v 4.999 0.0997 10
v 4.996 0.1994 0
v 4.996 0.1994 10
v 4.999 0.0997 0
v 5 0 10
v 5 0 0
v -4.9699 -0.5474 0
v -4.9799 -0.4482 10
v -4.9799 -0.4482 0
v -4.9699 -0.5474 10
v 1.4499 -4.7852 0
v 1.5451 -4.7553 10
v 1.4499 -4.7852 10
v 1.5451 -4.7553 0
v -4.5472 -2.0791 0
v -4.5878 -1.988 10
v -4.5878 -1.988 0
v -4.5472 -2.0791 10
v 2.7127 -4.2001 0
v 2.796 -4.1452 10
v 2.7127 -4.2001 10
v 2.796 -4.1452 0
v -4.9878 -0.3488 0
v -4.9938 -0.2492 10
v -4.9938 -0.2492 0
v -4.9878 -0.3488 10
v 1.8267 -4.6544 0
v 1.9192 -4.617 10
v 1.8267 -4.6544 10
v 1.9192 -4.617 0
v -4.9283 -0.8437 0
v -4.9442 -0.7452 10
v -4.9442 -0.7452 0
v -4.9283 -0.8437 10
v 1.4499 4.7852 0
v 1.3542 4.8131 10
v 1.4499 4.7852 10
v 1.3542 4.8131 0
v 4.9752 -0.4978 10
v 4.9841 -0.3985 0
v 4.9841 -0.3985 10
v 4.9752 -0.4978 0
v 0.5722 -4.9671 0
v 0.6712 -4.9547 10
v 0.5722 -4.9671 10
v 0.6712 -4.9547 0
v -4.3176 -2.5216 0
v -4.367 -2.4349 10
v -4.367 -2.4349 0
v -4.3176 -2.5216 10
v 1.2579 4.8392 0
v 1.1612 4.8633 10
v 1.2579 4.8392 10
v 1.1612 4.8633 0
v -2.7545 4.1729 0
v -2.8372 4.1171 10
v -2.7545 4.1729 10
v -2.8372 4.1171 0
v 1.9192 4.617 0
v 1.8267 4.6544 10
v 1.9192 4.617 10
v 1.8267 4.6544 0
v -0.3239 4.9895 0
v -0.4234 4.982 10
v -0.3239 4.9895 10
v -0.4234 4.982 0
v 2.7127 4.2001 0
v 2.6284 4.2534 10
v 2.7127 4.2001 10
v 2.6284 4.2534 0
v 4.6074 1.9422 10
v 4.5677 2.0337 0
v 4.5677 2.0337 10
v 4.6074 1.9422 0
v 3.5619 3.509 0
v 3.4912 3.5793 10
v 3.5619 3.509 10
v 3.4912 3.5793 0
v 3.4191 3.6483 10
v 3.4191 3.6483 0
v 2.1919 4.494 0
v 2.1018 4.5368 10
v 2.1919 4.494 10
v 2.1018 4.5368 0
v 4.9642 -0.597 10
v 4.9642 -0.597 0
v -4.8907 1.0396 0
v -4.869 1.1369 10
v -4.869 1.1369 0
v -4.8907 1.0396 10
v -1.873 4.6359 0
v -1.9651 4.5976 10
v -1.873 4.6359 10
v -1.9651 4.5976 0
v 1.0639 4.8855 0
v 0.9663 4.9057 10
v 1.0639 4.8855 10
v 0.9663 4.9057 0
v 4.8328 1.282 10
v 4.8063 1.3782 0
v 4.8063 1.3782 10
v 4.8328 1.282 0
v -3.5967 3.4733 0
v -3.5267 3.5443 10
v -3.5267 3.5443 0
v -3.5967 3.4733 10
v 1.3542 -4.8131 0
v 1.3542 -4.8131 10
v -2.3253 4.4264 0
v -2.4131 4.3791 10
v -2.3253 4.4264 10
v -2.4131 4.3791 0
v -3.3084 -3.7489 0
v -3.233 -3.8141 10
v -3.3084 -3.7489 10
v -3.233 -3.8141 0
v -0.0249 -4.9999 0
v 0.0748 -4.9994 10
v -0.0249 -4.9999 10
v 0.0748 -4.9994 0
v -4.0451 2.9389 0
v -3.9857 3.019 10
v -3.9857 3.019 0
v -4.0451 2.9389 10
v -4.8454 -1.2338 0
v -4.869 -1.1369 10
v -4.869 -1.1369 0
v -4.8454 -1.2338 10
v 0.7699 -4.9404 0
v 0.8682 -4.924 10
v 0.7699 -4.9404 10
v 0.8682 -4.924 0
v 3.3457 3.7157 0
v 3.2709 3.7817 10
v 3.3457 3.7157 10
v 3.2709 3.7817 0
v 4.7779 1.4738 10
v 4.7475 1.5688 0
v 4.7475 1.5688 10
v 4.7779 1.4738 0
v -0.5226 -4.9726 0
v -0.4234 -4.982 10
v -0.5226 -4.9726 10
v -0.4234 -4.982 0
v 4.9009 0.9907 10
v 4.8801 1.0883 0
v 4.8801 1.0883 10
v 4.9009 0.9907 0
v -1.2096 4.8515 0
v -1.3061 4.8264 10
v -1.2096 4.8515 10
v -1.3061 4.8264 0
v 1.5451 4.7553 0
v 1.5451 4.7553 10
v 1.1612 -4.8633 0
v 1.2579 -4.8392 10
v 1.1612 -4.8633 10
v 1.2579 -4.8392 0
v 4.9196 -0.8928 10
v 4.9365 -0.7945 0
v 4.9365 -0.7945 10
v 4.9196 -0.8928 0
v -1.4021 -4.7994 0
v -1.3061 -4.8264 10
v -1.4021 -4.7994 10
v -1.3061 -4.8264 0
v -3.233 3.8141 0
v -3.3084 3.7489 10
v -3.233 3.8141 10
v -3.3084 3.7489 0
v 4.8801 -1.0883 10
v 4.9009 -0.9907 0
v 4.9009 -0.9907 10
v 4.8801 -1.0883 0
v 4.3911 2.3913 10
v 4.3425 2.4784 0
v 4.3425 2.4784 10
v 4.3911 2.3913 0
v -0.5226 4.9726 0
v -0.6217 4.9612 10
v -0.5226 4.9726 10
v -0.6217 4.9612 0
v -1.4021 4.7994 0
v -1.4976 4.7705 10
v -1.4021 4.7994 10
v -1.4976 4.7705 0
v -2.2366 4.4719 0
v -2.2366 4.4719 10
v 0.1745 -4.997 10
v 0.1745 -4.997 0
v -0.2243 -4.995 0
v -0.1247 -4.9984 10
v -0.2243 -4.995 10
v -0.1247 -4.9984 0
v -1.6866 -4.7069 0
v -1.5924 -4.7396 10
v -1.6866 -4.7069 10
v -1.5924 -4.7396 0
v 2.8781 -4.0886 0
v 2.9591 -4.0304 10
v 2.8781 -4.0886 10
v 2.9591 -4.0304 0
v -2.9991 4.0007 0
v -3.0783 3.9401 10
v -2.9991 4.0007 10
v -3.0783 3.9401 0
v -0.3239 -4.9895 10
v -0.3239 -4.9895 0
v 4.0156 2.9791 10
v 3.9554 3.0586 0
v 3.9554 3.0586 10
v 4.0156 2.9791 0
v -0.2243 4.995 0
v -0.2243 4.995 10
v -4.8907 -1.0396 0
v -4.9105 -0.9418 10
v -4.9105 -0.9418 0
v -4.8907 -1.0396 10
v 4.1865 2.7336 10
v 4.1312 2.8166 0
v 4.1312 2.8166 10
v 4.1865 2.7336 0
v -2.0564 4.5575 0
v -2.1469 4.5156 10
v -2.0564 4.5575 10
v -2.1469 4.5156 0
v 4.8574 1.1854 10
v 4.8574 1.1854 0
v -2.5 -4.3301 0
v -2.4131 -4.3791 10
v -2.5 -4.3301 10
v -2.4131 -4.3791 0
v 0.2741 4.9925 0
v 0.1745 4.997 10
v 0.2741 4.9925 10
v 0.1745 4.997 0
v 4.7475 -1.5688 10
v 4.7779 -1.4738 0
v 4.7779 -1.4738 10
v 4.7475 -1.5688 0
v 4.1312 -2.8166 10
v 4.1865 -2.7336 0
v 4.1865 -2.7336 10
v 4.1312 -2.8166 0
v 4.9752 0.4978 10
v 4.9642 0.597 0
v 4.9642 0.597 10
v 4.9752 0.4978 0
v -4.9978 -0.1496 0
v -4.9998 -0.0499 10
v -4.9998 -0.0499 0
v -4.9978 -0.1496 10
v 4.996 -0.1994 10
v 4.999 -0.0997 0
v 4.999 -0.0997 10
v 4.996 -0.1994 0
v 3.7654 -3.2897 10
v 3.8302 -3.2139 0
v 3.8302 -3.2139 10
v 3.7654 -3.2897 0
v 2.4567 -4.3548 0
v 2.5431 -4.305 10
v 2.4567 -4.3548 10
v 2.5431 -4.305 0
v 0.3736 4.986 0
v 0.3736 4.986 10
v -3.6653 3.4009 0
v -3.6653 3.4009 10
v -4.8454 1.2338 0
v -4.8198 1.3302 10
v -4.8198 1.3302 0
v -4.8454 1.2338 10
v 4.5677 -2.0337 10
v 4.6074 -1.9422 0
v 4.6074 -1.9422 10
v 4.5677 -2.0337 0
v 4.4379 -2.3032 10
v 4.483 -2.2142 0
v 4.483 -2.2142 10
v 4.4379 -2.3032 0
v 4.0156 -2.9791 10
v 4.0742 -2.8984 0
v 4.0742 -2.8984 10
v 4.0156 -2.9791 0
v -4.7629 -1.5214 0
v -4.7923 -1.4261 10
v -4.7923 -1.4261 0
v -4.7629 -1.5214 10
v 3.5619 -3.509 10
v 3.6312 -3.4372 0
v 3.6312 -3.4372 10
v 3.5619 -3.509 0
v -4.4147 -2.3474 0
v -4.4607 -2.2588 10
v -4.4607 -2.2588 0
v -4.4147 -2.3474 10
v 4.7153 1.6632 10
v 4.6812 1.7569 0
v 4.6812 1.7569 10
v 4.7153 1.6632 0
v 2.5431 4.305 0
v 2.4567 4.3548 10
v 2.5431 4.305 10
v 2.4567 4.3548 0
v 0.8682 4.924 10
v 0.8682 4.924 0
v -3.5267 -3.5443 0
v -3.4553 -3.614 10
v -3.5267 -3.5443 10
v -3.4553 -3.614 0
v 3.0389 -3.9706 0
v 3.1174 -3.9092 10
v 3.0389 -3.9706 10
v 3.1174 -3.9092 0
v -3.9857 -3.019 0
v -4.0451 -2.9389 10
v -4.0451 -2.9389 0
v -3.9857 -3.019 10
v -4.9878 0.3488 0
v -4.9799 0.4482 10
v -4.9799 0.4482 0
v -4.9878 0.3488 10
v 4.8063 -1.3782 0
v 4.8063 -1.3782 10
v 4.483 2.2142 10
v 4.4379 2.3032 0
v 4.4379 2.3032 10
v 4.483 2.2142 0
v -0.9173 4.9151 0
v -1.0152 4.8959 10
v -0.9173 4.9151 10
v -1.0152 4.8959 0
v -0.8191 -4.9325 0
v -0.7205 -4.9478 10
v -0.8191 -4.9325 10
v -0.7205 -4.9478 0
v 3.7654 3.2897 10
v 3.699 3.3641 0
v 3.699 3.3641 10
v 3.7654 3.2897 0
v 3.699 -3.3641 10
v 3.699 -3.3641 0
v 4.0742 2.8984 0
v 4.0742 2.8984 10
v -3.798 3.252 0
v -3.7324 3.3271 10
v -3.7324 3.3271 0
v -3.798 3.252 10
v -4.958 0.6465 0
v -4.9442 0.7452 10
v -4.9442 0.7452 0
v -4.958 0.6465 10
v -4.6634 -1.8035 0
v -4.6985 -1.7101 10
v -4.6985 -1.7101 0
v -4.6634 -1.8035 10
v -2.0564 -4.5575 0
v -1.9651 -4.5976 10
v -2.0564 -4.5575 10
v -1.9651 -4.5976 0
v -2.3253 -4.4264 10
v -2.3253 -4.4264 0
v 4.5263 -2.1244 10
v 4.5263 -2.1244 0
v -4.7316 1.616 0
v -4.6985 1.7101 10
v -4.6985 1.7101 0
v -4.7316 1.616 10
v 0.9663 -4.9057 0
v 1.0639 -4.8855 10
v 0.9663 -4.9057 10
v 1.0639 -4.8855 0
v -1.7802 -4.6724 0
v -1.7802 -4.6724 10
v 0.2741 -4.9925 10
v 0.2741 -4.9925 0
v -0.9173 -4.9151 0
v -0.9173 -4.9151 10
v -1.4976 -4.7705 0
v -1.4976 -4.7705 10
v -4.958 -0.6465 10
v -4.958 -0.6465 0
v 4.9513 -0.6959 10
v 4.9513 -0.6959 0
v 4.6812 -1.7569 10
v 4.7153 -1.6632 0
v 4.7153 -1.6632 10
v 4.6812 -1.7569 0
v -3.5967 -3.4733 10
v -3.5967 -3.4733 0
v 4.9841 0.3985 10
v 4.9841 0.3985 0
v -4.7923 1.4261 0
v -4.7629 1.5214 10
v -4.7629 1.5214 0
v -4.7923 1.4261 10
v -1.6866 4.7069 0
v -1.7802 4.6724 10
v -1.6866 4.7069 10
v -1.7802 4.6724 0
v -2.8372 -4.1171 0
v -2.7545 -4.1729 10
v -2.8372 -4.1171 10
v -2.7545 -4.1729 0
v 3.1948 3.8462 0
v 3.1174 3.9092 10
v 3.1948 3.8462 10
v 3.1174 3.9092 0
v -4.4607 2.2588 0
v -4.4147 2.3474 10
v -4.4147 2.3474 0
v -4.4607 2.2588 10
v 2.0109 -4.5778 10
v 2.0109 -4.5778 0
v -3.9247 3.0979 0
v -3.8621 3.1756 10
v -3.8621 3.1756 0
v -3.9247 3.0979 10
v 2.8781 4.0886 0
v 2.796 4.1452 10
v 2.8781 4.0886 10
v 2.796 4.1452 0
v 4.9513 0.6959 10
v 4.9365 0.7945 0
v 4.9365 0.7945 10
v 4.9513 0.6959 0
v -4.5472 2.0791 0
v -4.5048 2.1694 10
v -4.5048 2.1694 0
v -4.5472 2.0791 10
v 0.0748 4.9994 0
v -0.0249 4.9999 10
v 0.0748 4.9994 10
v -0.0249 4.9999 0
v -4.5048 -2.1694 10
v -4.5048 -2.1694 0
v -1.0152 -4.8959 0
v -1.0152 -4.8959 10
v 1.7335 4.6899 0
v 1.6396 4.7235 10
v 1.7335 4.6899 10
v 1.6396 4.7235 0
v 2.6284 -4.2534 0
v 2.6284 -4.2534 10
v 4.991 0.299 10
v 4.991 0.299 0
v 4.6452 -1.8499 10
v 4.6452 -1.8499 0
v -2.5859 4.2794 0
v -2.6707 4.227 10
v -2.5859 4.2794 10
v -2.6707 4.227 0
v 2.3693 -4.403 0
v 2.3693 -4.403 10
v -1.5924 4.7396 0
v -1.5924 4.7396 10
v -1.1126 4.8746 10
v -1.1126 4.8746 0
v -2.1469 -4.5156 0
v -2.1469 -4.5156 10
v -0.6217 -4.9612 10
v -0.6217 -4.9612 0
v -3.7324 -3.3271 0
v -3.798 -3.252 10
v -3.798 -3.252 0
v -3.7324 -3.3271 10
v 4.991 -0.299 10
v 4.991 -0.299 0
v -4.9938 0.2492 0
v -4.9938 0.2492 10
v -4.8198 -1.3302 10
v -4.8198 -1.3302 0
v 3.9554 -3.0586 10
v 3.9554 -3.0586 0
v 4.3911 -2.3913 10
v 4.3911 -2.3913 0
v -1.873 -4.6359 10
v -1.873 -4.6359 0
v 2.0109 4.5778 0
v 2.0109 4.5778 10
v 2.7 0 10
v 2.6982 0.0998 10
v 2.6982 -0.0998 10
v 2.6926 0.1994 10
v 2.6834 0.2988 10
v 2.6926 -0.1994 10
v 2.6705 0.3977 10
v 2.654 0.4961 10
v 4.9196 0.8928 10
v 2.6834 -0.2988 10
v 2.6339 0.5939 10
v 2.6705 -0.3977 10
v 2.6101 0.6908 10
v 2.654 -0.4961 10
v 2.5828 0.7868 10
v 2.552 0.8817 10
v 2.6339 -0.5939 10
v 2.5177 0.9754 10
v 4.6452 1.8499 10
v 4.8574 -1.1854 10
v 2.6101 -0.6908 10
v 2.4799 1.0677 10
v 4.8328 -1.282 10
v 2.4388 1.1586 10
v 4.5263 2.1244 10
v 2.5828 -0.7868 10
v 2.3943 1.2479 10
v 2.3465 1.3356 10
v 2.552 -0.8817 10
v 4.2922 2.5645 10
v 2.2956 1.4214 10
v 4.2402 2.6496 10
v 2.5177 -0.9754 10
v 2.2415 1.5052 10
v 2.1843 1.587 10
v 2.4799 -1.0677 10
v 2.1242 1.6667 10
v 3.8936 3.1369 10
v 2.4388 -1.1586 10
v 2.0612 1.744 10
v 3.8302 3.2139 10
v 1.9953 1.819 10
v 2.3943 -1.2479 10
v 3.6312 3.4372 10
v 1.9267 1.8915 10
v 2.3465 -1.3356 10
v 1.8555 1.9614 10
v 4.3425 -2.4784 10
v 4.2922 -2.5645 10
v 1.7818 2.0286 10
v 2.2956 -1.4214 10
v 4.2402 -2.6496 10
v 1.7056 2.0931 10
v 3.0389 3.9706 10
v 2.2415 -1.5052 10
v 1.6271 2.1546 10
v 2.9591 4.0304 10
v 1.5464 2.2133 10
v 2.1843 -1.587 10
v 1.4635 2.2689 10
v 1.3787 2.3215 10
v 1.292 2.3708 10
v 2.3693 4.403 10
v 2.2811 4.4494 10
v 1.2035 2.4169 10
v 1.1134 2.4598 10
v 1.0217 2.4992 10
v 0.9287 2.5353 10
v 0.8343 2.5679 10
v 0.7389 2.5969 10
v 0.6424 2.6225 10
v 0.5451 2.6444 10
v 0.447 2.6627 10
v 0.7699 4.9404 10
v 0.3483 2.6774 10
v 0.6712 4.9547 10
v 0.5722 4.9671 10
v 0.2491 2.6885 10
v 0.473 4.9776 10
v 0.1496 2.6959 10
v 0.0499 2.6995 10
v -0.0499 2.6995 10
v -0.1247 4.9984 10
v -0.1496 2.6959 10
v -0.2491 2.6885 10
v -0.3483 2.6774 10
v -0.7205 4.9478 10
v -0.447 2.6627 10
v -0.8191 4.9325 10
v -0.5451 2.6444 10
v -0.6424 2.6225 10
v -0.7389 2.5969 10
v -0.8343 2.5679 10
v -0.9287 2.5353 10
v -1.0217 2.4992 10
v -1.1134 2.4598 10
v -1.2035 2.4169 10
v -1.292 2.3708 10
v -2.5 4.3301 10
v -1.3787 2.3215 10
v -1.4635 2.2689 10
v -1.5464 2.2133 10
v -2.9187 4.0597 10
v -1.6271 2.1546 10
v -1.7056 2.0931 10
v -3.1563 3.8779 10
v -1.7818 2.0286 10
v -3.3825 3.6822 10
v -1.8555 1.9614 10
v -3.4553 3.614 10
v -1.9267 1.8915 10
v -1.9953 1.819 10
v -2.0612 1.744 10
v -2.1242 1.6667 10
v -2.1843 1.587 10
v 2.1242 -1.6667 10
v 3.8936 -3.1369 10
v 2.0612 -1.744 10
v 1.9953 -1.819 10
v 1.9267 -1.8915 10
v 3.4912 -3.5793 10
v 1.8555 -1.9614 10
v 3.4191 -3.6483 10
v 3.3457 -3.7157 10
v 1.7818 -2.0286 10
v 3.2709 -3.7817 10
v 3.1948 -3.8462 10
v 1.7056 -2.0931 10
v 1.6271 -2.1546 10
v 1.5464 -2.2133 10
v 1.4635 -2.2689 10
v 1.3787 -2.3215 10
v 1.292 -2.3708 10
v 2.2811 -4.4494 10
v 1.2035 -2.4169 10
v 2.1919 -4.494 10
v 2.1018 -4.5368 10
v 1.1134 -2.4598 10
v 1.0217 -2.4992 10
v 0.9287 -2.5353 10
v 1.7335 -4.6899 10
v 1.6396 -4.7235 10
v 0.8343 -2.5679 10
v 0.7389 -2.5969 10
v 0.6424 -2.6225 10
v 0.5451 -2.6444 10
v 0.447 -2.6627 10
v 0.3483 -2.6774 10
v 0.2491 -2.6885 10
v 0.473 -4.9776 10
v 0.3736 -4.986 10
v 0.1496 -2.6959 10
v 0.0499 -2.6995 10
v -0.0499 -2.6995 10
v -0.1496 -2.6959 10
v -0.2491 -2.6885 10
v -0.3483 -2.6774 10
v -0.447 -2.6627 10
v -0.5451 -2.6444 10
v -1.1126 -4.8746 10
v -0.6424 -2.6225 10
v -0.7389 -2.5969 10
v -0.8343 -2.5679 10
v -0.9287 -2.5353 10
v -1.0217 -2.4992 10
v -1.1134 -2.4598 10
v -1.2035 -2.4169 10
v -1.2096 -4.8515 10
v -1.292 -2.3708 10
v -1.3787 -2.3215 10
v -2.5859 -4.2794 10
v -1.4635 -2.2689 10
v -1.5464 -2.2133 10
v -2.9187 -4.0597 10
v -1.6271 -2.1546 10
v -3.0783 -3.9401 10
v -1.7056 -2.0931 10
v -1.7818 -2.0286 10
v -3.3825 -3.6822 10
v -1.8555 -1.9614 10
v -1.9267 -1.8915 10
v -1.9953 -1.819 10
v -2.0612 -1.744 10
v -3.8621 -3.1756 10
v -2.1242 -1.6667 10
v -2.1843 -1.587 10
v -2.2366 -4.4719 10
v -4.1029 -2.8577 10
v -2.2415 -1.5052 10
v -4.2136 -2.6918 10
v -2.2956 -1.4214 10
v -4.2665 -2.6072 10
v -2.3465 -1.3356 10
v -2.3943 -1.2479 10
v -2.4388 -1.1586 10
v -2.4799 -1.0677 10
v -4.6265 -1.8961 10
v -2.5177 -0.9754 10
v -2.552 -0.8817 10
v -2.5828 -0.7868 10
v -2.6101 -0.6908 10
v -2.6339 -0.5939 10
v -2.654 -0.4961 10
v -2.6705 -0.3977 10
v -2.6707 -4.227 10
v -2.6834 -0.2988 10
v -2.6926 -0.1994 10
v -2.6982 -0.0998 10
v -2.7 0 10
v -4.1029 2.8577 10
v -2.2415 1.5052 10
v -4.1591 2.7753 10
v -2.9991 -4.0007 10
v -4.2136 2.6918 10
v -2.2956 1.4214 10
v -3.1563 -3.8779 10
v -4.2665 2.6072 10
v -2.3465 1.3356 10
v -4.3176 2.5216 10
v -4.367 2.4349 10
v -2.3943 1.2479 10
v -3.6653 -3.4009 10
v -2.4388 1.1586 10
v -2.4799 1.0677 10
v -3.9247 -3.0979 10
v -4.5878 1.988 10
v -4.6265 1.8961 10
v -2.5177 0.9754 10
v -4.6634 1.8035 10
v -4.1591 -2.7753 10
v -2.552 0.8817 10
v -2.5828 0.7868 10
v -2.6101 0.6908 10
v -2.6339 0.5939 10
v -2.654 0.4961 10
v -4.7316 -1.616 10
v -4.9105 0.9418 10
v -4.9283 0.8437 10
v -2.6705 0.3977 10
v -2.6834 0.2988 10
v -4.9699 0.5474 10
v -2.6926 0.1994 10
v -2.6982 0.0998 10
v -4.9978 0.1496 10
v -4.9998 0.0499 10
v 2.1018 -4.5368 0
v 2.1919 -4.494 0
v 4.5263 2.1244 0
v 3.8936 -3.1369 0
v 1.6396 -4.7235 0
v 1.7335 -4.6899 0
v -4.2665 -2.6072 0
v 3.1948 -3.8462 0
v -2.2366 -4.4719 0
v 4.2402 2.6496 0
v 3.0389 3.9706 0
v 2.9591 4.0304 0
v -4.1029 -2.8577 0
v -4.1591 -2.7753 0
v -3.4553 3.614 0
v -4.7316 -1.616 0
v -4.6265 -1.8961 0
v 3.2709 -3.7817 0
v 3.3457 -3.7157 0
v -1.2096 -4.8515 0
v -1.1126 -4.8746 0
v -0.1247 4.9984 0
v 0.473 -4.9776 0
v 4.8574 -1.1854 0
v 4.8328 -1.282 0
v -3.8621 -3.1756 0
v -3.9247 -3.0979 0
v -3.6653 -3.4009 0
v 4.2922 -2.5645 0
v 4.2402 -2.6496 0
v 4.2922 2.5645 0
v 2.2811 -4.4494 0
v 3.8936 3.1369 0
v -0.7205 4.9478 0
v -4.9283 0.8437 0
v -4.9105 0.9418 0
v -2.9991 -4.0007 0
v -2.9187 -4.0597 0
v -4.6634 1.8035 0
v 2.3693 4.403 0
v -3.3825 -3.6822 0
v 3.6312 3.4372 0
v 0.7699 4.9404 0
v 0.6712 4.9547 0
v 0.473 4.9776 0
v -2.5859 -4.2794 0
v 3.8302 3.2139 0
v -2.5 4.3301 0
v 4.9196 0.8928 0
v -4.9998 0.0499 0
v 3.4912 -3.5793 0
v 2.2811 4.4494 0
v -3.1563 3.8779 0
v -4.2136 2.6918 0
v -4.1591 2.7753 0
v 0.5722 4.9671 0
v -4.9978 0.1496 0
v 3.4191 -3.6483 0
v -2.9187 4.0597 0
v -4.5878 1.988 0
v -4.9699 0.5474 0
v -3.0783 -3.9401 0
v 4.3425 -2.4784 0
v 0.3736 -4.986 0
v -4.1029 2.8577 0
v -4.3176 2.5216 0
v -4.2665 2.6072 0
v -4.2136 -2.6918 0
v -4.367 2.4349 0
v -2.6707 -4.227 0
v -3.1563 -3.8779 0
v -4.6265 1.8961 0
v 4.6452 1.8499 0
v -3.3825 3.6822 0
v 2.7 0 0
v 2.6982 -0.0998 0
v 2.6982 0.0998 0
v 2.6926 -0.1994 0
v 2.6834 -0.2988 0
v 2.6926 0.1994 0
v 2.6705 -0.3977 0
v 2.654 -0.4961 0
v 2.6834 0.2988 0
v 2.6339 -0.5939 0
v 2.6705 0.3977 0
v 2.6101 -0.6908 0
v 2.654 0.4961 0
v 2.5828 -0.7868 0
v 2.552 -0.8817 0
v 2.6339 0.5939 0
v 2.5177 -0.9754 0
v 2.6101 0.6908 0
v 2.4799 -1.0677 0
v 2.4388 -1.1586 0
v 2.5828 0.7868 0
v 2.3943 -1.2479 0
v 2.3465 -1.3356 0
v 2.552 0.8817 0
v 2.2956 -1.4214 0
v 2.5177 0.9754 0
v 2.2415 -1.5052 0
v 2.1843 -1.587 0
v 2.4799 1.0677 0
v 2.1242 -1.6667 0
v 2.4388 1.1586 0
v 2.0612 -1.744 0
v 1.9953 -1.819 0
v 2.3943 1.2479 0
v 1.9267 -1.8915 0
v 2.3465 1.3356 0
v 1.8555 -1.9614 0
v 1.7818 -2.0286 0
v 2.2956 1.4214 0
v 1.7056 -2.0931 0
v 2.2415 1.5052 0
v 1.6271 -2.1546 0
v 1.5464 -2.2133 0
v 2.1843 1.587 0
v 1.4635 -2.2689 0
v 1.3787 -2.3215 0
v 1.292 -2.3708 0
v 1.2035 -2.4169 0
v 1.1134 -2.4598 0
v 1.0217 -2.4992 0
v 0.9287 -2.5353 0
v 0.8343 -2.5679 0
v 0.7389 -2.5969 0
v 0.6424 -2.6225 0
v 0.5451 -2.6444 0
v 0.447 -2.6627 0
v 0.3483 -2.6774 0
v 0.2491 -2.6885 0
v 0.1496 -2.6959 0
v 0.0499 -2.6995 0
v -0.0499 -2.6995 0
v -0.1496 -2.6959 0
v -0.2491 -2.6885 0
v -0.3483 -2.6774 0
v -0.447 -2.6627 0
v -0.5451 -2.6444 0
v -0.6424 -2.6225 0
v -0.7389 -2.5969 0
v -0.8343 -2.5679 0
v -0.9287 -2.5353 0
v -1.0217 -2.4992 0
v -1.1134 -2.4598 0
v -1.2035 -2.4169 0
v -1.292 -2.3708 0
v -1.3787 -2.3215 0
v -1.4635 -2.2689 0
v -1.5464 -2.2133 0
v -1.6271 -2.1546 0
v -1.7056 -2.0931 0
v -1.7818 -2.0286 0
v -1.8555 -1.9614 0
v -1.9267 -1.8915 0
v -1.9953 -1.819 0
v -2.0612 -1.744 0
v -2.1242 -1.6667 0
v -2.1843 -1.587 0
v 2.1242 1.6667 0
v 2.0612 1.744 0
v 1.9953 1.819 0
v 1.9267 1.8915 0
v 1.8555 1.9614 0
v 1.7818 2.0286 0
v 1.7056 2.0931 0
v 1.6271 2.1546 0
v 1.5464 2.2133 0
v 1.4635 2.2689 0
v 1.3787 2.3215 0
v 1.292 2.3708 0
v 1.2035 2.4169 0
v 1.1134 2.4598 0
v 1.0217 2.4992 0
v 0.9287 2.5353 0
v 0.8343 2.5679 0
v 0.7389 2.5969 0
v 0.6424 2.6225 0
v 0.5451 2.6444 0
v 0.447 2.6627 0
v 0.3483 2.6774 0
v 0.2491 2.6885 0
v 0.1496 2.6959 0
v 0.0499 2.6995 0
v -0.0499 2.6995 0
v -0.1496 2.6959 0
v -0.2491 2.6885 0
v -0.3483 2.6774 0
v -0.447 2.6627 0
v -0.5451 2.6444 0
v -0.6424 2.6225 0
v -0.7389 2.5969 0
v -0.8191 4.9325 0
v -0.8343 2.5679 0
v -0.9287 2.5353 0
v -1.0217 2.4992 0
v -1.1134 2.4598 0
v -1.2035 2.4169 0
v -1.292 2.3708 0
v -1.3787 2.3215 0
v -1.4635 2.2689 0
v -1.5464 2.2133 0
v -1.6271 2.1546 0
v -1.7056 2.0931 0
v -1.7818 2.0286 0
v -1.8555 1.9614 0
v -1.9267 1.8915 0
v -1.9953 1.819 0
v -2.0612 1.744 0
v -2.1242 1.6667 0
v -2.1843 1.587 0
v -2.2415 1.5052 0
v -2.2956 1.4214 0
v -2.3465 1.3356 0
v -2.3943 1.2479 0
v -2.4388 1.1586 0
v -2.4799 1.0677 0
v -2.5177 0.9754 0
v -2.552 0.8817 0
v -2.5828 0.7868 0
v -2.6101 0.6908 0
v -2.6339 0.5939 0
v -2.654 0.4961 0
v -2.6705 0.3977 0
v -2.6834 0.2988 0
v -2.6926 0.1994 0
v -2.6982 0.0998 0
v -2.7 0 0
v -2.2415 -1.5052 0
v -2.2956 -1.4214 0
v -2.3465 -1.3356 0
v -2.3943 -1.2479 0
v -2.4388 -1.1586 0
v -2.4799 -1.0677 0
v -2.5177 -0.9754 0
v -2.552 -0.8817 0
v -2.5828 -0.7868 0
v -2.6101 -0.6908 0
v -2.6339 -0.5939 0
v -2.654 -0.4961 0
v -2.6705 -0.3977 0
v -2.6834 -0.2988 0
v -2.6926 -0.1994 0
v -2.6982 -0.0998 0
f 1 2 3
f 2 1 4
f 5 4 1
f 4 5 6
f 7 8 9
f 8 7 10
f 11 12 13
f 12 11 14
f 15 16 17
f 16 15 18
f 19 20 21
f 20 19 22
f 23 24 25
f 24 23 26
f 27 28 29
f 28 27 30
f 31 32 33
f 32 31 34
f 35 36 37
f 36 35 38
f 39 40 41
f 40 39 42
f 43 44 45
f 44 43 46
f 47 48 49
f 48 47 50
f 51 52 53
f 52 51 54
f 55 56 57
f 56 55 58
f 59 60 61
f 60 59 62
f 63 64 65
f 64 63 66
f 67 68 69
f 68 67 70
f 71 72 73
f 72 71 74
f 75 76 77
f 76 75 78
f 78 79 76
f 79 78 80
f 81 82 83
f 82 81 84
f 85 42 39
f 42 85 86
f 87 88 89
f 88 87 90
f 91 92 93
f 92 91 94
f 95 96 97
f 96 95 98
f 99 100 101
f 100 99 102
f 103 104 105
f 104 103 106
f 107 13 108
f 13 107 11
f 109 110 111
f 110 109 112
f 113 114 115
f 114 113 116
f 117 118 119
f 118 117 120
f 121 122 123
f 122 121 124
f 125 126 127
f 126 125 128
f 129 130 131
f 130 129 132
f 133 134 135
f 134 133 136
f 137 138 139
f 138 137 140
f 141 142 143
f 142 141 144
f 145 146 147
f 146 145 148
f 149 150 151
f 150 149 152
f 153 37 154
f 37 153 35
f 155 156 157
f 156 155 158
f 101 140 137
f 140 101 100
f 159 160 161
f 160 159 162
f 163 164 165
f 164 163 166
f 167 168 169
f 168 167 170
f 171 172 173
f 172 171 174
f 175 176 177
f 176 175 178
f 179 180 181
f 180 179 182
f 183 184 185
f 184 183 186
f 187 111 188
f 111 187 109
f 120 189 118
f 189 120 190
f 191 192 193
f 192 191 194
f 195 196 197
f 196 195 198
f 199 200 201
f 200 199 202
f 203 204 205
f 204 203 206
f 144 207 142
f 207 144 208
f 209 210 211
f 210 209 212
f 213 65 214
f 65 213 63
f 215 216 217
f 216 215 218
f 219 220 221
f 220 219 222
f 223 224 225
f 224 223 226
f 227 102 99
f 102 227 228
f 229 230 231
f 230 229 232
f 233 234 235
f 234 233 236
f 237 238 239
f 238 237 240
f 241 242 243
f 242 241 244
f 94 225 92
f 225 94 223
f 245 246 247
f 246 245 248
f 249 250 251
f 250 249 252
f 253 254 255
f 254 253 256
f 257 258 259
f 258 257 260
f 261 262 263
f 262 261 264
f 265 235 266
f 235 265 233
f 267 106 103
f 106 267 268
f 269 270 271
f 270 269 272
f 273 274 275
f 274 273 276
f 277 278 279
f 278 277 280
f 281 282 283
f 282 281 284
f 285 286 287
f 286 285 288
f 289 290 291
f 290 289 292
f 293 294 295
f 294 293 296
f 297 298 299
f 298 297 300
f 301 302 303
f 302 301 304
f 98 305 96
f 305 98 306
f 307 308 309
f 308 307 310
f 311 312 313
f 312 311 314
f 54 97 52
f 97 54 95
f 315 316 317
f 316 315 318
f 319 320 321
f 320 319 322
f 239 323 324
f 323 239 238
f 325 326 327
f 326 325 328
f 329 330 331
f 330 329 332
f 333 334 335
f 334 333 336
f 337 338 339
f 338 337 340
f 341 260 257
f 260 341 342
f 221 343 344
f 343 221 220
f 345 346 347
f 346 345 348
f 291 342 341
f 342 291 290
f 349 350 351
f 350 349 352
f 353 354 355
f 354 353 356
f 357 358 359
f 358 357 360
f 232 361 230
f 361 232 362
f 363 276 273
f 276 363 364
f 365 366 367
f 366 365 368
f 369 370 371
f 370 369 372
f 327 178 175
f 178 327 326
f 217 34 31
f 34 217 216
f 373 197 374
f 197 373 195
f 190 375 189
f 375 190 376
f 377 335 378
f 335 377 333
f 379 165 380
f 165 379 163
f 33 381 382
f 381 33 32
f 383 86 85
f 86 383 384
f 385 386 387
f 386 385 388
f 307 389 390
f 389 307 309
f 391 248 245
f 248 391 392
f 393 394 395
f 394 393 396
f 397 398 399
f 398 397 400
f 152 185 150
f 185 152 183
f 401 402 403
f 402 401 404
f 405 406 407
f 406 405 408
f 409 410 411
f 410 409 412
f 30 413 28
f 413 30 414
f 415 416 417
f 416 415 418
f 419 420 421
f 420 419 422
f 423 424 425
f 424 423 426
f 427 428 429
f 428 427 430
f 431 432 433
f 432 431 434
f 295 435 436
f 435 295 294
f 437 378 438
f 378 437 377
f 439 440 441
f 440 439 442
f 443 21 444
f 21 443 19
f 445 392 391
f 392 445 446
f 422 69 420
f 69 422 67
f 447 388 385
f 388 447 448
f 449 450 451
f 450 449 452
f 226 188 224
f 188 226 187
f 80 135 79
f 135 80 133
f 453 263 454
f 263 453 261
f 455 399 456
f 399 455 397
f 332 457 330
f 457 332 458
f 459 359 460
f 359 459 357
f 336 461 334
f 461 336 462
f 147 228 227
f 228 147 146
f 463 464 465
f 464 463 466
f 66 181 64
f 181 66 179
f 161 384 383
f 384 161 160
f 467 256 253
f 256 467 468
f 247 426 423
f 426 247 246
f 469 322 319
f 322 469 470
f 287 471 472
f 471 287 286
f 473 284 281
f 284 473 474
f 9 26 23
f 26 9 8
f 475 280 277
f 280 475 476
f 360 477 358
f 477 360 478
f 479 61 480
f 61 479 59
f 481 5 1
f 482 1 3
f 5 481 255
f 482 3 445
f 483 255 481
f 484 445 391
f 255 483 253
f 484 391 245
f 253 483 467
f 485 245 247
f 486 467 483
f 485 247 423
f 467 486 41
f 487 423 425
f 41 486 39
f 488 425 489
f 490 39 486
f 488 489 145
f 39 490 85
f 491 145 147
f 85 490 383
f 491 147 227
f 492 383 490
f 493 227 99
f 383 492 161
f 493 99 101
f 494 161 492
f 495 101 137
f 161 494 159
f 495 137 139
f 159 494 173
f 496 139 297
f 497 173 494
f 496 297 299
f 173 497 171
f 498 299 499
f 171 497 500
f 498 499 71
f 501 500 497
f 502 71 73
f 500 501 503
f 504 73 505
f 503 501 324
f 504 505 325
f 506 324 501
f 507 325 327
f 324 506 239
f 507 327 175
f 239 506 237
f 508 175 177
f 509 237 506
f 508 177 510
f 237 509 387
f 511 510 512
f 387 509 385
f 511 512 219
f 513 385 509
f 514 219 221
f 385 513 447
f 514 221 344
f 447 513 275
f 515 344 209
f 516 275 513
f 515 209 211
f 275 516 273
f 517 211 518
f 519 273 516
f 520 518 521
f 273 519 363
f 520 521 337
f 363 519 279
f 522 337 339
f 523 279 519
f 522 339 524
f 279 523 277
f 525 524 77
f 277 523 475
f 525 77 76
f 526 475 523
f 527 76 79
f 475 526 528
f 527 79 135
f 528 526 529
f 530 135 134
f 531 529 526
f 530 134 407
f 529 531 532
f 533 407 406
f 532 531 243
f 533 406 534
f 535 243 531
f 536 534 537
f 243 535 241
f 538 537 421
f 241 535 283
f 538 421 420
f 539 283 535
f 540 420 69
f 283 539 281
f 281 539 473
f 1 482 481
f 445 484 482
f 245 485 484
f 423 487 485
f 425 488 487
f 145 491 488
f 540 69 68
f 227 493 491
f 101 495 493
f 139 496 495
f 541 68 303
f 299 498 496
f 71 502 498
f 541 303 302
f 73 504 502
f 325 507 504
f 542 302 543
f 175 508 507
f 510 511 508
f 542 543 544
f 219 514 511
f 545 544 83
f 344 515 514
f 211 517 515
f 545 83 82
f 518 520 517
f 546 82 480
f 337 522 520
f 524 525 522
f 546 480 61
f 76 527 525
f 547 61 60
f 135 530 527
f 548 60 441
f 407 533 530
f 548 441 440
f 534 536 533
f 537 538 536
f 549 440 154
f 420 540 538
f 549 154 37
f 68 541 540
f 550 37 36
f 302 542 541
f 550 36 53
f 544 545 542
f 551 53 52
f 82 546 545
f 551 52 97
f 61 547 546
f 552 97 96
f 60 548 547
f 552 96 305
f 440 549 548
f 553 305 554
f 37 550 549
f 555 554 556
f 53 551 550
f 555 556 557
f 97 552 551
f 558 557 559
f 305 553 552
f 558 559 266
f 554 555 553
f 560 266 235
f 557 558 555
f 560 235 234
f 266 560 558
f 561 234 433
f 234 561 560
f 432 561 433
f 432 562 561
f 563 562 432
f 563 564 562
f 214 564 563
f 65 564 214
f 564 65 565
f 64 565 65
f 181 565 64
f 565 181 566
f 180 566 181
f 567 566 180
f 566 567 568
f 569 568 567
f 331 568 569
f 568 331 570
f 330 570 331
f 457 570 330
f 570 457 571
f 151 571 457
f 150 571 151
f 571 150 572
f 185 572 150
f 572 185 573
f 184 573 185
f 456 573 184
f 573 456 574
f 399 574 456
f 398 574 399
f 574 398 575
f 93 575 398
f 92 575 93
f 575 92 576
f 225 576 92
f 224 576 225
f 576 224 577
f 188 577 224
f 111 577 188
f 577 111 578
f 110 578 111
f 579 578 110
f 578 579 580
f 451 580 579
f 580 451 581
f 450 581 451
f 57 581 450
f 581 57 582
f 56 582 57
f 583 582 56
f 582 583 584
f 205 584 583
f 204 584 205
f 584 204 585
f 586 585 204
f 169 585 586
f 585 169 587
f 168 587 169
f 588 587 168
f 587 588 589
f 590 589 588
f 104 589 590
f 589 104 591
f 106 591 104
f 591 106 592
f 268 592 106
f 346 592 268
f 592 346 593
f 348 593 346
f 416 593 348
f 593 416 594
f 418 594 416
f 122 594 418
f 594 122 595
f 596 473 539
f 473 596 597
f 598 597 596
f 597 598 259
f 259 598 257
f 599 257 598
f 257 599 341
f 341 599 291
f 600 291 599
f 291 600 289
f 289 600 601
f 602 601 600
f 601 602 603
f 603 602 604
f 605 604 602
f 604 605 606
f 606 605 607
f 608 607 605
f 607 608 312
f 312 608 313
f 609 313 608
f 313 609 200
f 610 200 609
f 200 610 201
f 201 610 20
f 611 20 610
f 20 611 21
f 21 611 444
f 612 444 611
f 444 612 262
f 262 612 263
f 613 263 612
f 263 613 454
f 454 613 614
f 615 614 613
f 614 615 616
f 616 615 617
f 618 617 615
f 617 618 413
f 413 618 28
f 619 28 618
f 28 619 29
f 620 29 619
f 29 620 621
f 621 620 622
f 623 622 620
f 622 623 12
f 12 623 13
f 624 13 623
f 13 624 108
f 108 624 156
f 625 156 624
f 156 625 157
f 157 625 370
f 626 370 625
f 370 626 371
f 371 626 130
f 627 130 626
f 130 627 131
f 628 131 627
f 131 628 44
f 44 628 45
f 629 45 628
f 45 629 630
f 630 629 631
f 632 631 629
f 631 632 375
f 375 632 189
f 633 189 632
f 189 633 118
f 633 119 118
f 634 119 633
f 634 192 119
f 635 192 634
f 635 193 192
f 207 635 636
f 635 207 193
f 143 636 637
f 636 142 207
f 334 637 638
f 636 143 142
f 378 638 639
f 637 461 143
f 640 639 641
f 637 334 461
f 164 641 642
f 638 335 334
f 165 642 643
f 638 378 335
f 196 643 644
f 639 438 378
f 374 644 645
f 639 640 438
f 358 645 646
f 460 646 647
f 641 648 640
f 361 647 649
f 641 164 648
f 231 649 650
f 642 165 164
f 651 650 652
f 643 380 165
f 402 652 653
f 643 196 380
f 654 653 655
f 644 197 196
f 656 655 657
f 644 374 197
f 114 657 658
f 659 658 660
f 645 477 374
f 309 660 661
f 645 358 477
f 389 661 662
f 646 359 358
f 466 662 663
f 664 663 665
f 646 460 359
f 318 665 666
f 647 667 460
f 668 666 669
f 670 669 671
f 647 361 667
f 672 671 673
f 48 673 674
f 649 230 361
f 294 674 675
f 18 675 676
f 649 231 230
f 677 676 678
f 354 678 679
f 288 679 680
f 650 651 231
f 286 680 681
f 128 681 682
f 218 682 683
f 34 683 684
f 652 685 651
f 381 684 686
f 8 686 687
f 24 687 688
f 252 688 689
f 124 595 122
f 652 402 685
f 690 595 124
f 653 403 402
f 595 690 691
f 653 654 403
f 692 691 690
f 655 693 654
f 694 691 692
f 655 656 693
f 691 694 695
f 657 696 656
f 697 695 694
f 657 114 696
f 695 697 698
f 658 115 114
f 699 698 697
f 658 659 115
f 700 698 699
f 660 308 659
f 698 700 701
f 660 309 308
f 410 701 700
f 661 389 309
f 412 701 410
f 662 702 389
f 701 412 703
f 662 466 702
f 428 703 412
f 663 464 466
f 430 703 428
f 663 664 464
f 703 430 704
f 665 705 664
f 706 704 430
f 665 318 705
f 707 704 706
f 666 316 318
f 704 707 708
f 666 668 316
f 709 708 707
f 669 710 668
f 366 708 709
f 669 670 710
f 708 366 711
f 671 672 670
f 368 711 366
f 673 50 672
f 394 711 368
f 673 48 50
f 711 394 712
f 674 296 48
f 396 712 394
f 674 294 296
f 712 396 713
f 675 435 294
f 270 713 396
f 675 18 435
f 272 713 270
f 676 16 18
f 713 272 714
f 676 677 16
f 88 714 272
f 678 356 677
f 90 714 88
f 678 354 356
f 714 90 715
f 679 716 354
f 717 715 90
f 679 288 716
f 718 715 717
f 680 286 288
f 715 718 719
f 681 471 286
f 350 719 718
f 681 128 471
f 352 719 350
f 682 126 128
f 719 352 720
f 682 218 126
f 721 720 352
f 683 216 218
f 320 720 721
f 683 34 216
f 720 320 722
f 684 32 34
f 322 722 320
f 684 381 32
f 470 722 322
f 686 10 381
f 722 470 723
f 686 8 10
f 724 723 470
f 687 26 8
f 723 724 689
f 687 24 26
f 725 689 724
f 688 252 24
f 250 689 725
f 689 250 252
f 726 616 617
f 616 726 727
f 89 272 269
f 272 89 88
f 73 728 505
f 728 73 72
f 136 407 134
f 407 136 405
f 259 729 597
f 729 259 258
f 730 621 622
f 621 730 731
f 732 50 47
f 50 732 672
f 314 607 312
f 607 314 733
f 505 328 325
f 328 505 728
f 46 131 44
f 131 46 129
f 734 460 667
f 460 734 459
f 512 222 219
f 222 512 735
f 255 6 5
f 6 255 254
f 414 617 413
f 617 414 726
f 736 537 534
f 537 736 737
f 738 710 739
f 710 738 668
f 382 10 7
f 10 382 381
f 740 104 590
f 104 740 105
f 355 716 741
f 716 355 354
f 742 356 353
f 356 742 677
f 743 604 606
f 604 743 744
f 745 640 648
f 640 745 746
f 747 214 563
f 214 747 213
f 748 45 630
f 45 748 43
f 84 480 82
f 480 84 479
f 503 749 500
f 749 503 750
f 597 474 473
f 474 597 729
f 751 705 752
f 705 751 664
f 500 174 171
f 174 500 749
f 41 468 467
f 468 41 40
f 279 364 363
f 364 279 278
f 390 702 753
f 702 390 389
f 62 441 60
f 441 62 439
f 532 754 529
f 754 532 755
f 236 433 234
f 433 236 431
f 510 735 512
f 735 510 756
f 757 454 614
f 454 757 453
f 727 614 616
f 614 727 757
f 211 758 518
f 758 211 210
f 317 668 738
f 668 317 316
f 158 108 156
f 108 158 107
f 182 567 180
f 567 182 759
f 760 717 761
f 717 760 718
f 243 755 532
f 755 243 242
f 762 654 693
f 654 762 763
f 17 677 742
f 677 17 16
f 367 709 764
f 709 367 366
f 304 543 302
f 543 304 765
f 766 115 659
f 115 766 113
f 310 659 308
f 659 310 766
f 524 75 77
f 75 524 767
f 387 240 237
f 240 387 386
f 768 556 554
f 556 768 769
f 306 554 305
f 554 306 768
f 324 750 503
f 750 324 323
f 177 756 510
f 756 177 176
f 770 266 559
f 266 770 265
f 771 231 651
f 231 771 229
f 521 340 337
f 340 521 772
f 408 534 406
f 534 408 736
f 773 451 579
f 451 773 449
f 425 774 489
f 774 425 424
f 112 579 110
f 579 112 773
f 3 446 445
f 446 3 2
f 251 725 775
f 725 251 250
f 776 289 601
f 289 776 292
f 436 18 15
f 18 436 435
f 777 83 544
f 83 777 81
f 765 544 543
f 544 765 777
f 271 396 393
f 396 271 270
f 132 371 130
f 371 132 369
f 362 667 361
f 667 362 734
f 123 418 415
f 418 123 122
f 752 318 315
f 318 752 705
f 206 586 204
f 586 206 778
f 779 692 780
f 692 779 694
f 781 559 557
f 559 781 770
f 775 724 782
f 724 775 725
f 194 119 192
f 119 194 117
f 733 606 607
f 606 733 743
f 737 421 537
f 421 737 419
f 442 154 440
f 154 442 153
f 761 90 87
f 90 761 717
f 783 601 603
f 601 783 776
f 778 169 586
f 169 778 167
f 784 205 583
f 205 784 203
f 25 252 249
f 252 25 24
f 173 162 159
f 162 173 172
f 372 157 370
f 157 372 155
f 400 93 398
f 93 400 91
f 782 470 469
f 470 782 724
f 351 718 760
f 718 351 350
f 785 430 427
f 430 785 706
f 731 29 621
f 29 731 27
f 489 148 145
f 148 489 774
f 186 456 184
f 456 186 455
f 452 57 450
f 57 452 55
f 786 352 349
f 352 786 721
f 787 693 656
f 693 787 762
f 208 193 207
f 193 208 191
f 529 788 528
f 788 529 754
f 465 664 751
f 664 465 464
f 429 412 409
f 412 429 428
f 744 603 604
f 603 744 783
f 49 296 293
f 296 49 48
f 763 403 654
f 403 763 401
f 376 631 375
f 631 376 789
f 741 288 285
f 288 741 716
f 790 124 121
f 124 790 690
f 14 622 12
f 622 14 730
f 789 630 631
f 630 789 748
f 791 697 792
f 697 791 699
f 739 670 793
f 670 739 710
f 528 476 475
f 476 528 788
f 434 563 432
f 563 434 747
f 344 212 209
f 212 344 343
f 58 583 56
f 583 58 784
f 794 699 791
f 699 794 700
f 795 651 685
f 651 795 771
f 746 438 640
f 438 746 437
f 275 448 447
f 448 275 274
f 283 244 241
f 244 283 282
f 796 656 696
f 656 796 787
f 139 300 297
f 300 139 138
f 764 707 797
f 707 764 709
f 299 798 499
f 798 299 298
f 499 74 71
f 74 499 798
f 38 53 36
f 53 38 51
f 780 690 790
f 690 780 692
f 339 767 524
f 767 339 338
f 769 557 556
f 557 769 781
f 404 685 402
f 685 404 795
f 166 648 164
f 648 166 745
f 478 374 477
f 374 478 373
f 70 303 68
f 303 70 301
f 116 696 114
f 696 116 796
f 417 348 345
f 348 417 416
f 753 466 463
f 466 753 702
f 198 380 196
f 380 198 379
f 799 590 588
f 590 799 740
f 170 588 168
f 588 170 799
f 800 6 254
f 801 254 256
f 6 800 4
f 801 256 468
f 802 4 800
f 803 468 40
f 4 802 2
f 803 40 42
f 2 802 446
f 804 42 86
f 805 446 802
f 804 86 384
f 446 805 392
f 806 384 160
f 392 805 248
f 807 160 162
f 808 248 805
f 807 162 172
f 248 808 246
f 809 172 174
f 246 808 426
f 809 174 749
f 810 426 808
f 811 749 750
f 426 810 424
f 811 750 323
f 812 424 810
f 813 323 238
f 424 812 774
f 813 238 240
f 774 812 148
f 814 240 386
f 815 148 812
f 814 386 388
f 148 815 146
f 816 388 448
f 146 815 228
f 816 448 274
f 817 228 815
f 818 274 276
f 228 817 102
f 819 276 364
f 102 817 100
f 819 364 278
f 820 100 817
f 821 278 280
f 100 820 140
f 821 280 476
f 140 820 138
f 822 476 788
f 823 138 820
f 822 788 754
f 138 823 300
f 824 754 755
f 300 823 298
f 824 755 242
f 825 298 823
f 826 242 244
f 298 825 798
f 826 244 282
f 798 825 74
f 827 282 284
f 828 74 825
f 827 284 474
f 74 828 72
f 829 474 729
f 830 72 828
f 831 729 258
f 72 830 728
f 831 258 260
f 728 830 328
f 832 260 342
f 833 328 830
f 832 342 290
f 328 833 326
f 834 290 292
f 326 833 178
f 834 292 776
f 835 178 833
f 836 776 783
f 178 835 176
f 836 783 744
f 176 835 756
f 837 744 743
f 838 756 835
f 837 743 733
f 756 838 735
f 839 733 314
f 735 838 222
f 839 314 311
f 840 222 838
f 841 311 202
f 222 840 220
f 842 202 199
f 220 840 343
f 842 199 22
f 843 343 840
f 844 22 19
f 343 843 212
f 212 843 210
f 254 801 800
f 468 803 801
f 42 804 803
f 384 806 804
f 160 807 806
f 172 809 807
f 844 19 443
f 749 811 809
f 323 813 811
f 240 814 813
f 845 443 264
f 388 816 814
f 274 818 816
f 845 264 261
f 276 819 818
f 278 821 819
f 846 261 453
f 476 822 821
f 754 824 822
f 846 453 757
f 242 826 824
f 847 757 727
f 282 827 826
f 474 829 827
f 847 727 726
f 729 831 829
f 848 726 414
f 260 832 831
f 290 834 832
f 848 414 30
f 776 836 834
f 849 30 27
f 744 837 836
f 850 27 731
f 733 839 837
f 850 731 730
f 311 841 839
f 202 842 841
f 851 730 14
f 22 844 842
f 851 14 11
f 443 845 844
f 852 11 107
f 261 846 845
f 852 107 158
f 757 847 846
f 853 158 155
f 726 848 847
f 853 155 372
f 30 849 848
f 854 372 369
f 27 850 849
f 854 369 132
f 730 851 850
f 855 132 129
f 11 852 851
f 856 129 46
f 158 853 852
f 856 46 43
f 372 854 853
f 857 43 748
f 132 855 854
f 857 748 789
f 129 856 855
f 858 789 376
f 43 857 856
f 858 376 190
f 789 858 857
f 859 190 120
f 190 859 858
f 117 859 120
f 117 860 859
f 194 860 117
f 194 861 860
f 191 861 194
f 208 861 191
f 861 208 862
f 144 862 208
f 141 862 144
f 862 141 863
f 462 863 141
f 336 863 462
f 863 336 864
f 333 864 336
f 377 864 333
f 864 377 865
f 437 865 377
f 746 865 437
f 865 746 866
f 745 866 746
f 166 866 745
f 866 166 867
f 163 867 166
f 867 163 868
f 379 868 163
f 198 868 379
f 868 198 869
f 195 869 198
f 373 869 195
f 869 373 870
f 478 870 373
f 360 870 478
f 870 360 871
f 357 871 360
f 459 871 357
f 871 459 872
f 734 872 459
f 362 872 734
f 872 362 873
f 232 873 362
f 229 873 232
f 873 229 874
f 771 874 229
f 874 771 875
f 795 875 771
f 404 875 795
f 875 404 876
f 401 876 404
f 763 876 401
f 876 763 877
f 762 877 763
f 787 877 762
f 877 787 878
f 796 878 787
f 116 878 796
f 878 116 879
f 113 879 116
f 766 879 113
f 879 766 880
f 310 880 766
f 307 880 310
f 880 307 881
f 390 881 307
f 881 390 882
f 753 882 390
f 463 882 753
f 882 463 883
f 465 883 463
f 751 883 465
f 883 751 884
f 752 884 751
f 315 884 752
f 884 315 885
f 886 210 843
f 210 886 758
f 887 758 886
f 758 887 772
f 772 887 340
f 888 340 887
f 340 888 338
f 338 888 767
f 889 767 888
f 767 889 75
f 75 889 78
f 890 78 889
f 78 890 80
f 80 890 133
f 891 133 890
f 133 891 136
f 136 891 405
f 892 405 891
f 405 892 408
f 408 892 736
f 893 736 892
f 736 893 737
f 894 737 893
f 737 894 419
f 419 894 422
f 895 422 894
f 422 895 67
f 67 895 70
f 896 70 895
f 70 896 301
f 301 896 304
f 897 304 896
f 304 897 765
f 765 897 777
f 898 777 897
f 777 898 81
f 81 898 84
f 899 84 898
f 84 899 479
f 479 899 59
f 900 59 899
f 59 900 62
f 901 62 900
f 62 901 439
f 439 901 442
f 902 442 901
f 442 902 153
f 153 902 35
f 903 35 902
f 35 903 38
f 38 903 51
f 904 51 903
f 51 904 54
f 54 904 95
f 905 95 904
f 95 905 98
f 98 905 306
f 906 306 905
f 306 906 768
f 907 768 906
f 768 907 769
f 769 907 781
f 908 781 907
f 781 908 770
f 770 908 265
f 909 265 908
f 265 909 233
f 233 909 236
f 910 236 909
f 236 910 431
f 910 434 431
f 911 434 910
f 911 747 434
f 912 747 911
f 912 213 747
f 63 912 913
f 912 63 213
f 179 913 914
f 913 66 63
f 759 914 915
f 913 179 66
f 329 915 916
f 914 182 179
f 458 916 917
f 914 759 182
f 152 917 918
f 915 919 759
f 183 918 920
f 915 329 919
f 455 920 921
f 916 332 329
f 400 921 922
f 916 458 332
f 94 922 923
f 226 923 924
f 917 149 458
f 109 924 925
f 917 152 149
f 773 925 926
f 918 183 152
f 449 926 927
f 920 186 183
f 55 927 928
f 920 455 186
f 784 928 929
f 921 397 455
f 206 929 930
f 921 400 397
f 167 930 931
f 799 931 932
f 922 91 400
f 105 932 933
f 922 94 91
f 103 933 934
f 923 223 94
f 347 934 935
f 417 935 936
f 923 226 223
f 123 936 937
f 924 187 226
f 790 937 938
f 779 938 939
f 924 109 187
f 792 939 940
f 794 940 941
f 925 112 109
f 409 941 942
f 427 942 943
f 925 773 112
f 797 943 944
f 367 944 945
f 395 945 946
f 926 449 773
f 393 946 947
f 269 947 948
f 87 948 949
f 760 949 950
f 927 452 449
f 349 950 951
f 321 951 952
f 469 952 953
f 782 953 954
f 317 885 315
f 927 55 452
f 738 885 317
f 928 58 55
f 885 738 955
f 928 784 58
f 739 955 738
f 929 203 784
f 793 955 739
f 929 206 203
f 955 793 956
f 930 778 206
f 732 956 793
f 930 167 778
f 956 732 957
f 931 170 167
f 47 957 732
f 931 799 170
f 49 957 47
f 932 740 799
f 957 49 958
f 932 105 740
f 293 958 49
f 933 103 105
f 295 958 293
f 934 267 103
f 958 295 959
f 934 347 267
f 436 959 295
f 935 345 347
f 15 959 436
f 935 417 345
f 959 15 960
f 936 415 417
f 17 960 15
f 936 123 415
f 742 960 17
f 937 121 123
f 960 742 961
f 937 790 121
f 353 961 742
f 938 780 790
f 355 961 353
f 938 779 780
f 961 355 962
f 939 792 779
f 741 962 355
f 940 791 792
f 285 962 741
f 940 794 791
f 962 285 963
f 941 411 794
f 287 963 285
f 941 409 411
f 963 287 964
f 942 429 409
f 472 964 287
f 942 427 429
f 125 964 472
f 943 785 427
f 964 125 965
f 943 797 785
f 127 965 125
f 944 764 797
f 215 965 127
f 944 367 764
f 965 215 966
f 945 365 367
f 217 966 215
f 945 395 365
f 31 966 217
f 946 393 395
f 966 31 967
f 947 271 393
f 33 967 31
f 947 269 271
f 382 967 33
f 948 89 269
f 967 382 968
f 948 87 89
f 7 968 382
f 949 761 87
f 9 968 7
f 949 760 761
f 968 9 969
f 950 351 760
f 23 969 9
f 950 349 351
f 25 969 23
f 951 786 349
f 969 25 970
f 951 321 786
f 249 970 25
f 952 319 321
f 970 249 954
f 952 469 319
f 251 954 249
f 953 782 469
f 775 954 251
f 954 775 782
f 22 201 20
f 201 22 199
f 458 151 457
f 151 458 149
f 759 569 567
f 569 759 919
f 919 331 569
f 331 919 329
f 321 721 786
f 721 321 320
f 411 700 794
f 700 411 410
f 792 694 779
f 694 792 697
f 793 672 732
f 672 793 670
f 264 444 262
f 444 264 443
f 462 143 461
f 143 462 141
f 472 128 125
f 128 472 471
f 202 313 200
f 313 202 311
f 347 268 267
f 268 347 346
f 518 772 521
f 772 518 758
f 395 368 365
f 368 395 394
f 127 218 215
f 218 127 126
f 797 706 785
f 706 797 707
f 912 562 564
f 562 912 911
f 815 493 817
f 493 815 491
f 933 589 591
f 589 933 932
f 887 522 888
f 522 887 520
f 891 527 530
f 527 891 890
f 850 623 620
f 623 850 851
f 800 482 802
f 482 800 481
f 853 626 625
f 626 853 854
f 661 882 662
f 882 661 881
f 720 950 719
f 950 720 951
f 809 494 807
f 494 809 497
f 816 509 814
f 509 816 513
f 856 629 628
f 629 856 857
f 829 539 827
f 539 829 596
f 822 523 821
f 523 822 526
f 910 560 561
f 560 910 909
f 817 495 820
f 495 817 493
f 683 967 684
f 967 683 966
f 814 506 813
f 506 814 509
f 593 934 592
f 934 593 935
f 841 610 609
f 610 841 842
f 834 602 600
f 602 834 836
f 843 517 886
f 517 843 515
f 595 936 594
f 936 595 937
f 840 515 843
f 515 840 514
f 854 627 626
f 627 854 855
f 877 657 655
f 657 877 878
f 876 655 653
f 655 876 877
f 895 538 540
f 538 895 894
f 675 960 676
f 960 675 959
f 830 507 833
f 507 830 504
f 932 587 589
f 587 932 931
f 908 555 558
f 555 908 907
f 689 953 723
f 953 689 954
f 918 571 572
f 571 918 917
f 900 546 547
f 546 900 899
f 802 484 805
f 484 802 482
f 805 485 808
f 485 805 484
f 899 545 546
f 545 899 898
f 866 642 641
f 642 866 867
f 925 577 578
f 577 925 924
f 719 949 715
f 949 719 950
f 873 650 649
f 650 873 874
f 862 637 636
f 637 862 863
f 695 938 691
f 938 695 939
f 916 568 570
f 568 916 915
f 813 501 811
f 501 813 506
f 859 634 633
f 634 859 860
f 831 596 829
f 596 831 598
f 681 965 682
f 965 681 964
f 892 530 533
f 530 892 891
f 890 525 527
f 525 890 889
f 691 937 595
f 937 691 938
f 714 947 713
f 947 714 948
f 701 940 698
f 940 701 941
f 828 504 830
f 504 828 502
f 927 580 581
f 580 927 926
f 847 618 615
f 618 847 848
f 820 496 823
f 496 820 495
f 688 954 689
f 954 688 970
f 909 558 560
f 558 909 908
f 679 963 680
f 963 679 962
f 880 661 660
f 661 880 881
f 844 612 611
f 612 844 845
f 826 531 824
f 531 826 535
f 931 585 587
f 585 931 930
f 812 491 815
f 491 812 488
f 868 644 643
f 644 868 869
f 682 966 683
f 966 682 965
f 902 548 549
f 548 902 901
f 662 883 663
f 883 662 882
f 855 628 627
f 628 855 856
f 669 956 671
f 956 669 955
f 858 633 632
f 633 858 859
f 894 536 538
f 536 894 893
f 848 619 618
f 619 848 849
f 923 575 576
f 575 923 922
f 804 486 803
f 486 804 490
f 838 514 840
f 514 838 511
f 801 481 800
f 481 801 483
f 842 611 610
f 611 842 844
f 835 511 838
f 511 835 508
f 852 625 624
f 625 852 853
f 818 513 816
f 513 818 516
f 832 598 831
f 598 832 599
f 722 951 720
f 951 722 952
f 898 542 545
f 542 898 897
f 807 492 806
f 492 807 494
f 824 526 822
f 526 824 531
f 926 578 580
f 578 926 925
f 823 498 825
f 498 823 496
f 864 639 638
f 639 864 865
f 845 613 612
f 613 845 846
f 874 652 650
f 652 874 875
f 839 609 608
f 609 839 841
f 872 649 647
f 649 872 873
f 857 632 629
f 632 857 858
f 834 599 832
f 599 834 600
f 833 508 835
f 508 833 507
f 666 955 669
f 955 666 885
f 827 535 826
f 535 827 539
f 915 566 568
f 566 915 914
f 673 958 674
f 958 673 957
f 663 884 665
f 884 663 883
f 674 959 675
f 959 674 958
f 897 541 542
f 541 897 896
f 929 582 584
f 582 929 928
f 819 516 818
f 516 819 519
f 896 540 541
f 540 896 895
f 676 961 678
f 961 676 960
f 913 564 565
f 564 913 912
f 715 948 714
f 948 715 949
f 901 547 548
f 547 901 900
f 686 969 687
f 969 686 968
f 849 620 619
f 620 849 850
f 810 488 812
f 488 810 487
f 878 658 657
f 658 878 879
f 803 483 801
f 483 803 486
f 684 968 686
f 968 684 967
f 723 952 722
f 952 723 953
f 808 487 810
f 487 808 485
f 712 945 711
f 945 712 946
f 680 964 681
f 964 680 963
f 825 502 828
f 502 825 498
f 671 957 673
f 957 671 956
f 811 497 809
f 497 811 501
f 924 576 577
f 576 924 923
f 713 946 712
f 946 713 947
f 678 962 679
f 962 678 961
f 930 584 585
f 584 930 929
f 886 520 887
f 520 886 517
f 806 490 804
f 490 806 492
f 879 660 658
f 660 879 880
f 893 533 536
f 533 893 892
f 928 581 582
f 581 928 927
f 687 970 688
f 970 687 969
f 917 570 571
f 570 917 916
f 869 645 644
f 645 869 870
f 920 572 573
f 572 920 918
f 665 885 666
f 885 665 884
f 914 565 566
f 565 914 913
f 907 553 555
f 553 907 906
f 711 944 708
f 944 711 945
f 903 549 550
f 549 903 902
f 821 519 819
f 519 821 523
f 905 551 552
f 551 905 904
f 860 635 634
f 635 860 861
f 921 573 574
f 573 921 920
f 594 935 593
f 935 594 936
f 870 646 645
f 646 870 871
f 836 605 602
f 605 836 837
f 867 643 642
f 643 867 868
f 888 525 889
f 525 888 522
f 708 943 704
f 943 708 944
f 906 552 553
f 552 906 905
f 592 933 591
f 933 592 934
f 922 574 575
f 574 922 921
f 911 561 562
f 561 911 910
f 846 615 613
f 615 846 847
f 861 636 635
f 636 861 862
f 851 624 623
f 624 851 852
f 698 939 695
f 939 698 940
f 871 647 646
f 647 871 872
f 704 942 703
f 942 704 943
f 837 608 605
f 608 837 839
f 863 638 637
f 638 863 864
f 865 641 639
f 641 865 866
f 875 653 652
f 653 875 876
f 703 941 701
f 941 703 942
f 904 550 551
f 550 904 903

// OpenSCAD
// ============================================================
// Pulley Spacer
// Cylindrical spacer for GT2 pulley stacks on motion system
// ============================================================

$fa = 1.0;
$fs = 0.1;

// --- Dimensions (mm) ---
outer_dia = 10.0;
bore_dia  = 5.4;

// --- Modules ---

module pulley_spacer(height) {
    difference() {
        cylinder(h = height, d = outer_dia);
        translate([0, 0, -1])
            cylinder(h = height + 2, d = bore_dia);
    }
}

// --- Output ---
// pulley_spacer(height = 5);
// pulley_spacer(height = 1.4);
pulley_spacer(height = 10.0);
